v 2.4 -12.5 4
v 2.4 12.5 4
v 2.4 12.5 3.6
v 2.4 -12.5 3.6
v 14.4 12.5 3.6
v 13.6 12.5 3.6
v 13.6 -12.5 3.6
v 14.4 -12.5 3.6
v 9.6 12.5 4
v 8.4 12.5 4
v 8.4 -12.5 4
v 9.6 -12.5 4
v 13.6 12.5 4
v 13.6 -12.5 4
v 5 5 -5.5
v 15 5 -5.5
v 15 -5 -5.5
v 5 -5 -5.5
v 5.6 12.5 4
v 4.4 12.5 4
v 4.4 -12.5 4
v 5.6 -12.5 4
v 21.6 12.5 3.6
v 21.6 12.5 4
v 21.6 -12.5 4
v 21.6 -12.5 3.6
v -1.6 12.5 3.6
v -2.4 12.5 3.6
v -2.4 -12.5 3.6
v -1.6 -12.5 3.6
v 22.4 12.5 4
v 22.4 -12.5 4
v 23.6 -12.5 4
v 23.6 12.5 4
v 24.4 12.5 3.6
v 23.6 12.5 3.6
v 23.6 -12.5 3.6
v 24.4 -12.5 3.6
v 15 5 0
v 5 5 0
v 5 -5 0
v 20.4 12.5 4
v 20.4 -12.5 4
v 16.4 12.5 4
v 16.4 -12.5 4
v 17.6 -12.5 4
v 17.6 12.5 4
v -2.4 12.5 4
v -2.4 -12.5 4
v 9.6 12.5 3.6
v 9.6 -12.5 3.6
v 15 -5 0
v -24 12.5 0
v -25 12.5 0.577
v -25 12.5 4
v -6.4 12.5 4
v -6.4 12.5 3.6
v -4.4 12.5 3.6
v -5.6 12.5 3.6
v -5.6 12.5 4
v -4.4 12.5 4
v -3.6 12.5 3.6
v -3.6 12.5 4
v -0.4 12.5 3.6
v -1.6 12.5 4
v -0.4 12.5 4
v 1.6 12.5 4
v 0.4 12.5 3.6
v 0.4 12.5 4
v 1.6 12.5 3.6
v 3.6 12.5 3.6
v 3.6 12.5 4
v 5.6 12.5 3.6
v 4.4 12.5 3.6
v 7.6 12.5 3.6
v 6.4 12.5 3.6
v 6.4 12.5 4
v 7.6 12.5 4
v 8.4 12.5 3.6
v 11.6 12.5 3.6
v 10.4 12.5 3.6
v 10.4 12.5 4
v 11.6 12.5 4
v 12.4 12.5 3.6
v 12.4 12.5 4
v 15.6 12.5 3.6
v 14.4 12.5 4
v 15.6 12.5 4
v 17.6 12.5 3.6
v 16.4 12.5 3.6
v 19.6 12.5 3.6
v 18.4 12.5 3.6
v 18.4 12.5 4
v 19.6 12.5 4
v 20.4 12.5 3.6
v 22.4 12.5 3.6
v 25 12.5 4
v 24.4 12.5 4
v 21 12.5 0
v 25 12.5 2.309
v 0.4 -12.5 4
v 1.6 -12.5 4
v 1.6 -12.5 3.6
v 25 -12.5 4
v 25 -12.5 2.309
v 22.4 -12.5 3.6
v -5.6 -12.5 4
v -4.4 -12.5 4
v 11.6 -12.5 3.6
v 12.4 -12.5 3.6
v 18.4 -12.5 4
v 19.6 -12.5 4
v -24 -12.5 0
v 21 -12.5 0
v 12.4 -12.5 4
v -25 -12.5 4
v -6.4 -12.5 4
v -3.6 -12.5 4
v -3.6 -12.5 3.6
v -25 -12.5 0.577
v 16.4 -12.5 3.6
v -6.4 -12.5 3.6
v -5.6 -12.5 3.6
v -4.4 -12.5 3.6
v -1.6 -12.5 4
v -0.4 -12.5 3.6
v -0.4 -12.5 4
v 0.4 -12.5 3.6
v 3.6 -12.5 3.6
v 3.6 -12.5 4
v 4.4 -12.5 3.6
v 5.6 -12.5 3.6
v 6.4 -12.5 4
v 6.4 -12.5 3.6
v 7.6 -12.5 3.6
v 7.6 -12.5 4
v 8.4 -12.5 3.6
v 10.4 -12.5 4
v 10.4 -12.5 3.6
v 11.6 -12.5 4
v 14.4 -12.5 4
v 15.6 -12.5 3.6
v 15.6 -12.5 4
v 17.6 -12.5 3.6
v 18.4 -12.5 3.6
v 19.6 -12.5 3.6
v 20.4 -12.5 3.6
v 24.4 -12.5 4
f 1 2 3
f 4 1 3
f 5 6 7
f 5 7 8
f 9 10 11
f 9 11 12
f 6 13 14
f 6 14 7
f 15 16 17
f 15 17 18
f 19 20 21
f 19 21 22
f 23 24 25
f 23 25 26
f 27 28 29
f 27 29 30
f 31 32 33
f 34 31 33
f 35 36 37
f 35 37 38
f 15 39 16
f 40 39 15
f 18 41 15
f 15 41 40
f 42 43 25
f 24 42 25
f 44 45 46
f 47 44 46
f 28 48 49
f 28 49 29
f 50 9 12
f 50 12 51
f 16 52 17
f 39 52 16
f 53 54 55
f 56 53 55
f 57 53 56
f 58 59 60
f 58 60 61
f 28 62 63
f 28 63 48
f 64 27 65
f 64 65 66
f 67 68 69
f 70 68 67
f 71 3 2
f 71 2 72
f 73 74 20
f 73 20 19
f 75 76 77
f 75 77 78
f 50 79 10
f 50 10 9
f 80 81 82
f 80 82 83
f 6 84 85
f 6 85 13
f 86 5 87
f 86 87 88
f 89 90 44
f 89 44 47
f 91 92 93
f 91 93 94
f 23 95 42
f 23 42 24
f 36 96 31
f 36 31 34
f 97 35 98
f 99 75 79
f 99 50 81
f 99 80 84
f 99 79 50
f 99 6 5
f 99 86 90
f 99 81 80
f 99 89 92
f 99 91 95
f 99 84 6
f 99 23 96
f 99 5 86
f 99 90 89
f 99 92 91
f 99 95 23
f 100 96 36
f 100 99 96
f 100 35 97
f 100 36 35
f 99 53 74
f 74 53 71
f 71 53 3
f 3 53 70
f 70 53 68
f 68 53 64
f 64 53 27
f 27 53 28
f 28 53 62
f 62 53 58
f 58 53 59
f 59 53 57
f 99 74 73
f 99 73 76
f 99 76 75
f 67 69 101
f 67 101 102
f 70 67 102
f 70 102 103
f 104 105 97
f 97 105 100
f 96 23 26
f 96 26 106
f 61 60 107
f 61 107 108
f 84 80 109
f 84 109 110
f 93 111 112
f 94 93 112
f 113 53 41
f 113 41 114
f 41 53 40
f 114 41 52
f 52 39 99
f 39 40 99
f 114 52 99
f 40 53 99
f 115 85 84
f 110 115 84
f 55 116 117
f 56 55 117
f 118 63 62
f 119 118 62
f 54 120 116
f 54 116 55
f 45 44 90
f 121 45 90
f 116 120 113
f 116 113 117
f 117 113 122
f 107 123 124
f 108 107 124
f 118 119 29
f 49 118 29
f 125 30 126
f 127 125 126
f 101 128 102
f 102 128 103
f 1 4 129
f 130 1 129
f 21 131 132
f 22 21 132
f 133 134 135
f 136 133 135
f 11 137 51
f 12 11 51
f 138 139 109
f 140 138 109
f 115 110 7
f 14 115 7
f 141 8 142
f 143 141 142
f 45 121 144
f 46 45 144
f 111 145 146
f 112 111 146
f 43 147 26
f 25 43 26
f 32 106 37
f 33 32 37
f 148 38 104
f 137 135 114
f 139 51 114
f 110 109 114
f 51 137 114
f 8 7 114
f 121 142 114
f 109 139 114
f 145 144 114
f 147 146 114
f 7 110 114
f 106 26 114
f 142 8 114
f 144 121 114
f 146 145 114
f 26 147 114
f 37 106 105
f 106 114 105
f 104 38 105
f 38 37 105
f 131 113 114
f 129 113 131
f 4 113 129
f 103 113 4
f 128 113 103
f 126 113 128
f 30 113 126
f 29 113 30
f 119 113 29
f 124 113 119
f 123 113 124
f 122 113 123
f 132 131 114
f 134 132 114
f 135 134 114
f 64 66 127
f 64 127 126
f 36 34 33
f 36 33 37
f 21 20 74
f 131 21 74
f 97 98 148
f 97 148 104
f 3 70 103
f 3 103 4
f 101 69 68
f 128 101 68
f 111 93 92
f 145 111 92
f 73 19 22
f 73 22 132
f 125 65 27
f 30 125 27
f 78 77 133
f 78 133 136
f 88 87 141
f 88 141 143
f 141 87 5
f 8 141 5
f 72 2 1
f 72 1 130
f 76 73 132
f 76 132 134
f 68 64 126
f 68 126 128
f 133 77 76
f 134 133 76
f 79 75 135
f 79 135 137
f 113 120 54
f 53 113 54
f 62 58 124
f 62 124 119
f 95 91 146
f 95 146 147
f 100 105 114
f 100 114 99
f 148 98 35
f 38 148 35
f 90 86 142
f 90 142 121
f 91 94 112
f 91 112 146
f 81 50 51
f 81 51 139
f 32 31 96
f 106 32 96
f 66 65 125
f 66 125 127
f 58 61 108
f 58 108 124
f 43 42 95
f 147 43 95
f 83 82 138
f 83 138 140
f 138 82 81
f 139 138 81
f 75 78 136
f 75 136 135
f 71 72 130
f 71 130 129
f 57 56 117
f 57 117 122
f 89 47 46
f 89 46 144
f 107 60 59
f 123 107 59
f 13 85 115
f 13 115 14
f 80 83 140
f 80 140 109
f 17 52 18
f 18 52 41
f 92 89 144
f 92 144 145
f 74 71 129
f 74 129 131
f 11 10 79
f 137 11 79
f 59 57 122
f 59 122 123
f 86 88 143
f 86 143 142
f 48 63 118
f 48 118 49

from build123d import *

# Parameters (mm, degrees)
SKETCH1_W           = 50
SKETCH1_H           = 25
BOSS_EXTRUDE1_DEPTH = 4
CHAMFER1_SIZE       = 4
CHAMFER1_SIZE2      = 2.309401077
SKETCH2_W           = 10
SKETCH2_H           = 10
BOSS_EXTRUDE2_DEPTH = 5.5
CUT_EXTRUDE1_REACH  = 37.781
SKETCH3_W           = 0.8
SKETCH3_H           = 0.8
LPATTERN1_COUNT     = 16
LPATTERN1_PITCH     = 2
CHAMFER2_SIZE       = 1
CHAMFER2_SIZE2      = 0.577350269


with BuildPart() as part:
    # Sketch1 → Boss-Extrude1 (new body)
    with BuildSketch(Plane.XY):
        Rectangle(SKETCH1_W, SKETCH1_H)
    extrude(amount=BOSS_EXTRUDE1_DEPTH)

    # Chamfer1
    chamfer1_edges = [part.edges().sort_by_distance(p)[0] for p in [
        (25, 0, 0),
    ]]
    chamfer1_side = [part.faces().sort_by_distance(p)[0] for p in [
        (0, 0, 0),
    ]]
    chamfer(chamfer1_edges, length=CHAMFER1_SIZE, length2=CHAMFER1_SIZE2, reference=chamfer1_side[0])

    # Sketch2 → Boss-Extrude2 (add)
    with BuildSketch(Plane(origin=(0, 0, 0), x_dir=(-1, 0, 0), z_dir=(0, 0, -1))):
        with Locations((-10, 0)):
            Rectangle(SKETCH2_W, SKETCH2_H)
    extrude(amount=BOSS_EXTRUDE2_DEPTH)

    # Sketch3 → Cut-Extrude1 (cut, up to next)
    with BuildSketch(Plane(origin=(0, 12.5, 0), x_dir=(1, 0, 0), z_dir=(0, 1, 0)), mode=Mode.PRIVATE) as cut_extrude1_sk1:
        with Locations((24, -4)):
            Rectangle(SKETCH3_W, SKETCH3_H)
    cut_extrude1_tool1 = extrude(cut_extrude1_sk1.sketch, amount=-CUT_EXTRUDE1_REACH, mode=Mode.PRIVATE) & part.part
    cut_extrude1 = cut_extrude1_tool1.solids().sort_by_distance((24, 12.5, 4))[0]
    add(cut_extrude1, mode=Mode.SUBTRACT)

    # LPattern1: Cut-Extrude1 ×16
    with Locations(*[(-i * LPATTERN1_PITCH, 0, 0) for i in range(1, LPATTERN1_COUNT)]):
        add(cut_extrude1, mode=Mode.SUBTRACT)

    # Chamfer2
    chamfer2_edges = [part.edges().sort_by_distance(p)[0] for p in [
        (-25, 0, 0),
    ]]
    chamfer2_side = [part.faces().sort_by_distance(p)[0] for p in [
        (-3.142857143, 0, 0),
    ]]
    chamfer(chamfer2_edges, length=CHAMFER2_SIZE, length2=CHAMFER2_SIZE2, reference=chamfer2_side[0])


solid = part.part
